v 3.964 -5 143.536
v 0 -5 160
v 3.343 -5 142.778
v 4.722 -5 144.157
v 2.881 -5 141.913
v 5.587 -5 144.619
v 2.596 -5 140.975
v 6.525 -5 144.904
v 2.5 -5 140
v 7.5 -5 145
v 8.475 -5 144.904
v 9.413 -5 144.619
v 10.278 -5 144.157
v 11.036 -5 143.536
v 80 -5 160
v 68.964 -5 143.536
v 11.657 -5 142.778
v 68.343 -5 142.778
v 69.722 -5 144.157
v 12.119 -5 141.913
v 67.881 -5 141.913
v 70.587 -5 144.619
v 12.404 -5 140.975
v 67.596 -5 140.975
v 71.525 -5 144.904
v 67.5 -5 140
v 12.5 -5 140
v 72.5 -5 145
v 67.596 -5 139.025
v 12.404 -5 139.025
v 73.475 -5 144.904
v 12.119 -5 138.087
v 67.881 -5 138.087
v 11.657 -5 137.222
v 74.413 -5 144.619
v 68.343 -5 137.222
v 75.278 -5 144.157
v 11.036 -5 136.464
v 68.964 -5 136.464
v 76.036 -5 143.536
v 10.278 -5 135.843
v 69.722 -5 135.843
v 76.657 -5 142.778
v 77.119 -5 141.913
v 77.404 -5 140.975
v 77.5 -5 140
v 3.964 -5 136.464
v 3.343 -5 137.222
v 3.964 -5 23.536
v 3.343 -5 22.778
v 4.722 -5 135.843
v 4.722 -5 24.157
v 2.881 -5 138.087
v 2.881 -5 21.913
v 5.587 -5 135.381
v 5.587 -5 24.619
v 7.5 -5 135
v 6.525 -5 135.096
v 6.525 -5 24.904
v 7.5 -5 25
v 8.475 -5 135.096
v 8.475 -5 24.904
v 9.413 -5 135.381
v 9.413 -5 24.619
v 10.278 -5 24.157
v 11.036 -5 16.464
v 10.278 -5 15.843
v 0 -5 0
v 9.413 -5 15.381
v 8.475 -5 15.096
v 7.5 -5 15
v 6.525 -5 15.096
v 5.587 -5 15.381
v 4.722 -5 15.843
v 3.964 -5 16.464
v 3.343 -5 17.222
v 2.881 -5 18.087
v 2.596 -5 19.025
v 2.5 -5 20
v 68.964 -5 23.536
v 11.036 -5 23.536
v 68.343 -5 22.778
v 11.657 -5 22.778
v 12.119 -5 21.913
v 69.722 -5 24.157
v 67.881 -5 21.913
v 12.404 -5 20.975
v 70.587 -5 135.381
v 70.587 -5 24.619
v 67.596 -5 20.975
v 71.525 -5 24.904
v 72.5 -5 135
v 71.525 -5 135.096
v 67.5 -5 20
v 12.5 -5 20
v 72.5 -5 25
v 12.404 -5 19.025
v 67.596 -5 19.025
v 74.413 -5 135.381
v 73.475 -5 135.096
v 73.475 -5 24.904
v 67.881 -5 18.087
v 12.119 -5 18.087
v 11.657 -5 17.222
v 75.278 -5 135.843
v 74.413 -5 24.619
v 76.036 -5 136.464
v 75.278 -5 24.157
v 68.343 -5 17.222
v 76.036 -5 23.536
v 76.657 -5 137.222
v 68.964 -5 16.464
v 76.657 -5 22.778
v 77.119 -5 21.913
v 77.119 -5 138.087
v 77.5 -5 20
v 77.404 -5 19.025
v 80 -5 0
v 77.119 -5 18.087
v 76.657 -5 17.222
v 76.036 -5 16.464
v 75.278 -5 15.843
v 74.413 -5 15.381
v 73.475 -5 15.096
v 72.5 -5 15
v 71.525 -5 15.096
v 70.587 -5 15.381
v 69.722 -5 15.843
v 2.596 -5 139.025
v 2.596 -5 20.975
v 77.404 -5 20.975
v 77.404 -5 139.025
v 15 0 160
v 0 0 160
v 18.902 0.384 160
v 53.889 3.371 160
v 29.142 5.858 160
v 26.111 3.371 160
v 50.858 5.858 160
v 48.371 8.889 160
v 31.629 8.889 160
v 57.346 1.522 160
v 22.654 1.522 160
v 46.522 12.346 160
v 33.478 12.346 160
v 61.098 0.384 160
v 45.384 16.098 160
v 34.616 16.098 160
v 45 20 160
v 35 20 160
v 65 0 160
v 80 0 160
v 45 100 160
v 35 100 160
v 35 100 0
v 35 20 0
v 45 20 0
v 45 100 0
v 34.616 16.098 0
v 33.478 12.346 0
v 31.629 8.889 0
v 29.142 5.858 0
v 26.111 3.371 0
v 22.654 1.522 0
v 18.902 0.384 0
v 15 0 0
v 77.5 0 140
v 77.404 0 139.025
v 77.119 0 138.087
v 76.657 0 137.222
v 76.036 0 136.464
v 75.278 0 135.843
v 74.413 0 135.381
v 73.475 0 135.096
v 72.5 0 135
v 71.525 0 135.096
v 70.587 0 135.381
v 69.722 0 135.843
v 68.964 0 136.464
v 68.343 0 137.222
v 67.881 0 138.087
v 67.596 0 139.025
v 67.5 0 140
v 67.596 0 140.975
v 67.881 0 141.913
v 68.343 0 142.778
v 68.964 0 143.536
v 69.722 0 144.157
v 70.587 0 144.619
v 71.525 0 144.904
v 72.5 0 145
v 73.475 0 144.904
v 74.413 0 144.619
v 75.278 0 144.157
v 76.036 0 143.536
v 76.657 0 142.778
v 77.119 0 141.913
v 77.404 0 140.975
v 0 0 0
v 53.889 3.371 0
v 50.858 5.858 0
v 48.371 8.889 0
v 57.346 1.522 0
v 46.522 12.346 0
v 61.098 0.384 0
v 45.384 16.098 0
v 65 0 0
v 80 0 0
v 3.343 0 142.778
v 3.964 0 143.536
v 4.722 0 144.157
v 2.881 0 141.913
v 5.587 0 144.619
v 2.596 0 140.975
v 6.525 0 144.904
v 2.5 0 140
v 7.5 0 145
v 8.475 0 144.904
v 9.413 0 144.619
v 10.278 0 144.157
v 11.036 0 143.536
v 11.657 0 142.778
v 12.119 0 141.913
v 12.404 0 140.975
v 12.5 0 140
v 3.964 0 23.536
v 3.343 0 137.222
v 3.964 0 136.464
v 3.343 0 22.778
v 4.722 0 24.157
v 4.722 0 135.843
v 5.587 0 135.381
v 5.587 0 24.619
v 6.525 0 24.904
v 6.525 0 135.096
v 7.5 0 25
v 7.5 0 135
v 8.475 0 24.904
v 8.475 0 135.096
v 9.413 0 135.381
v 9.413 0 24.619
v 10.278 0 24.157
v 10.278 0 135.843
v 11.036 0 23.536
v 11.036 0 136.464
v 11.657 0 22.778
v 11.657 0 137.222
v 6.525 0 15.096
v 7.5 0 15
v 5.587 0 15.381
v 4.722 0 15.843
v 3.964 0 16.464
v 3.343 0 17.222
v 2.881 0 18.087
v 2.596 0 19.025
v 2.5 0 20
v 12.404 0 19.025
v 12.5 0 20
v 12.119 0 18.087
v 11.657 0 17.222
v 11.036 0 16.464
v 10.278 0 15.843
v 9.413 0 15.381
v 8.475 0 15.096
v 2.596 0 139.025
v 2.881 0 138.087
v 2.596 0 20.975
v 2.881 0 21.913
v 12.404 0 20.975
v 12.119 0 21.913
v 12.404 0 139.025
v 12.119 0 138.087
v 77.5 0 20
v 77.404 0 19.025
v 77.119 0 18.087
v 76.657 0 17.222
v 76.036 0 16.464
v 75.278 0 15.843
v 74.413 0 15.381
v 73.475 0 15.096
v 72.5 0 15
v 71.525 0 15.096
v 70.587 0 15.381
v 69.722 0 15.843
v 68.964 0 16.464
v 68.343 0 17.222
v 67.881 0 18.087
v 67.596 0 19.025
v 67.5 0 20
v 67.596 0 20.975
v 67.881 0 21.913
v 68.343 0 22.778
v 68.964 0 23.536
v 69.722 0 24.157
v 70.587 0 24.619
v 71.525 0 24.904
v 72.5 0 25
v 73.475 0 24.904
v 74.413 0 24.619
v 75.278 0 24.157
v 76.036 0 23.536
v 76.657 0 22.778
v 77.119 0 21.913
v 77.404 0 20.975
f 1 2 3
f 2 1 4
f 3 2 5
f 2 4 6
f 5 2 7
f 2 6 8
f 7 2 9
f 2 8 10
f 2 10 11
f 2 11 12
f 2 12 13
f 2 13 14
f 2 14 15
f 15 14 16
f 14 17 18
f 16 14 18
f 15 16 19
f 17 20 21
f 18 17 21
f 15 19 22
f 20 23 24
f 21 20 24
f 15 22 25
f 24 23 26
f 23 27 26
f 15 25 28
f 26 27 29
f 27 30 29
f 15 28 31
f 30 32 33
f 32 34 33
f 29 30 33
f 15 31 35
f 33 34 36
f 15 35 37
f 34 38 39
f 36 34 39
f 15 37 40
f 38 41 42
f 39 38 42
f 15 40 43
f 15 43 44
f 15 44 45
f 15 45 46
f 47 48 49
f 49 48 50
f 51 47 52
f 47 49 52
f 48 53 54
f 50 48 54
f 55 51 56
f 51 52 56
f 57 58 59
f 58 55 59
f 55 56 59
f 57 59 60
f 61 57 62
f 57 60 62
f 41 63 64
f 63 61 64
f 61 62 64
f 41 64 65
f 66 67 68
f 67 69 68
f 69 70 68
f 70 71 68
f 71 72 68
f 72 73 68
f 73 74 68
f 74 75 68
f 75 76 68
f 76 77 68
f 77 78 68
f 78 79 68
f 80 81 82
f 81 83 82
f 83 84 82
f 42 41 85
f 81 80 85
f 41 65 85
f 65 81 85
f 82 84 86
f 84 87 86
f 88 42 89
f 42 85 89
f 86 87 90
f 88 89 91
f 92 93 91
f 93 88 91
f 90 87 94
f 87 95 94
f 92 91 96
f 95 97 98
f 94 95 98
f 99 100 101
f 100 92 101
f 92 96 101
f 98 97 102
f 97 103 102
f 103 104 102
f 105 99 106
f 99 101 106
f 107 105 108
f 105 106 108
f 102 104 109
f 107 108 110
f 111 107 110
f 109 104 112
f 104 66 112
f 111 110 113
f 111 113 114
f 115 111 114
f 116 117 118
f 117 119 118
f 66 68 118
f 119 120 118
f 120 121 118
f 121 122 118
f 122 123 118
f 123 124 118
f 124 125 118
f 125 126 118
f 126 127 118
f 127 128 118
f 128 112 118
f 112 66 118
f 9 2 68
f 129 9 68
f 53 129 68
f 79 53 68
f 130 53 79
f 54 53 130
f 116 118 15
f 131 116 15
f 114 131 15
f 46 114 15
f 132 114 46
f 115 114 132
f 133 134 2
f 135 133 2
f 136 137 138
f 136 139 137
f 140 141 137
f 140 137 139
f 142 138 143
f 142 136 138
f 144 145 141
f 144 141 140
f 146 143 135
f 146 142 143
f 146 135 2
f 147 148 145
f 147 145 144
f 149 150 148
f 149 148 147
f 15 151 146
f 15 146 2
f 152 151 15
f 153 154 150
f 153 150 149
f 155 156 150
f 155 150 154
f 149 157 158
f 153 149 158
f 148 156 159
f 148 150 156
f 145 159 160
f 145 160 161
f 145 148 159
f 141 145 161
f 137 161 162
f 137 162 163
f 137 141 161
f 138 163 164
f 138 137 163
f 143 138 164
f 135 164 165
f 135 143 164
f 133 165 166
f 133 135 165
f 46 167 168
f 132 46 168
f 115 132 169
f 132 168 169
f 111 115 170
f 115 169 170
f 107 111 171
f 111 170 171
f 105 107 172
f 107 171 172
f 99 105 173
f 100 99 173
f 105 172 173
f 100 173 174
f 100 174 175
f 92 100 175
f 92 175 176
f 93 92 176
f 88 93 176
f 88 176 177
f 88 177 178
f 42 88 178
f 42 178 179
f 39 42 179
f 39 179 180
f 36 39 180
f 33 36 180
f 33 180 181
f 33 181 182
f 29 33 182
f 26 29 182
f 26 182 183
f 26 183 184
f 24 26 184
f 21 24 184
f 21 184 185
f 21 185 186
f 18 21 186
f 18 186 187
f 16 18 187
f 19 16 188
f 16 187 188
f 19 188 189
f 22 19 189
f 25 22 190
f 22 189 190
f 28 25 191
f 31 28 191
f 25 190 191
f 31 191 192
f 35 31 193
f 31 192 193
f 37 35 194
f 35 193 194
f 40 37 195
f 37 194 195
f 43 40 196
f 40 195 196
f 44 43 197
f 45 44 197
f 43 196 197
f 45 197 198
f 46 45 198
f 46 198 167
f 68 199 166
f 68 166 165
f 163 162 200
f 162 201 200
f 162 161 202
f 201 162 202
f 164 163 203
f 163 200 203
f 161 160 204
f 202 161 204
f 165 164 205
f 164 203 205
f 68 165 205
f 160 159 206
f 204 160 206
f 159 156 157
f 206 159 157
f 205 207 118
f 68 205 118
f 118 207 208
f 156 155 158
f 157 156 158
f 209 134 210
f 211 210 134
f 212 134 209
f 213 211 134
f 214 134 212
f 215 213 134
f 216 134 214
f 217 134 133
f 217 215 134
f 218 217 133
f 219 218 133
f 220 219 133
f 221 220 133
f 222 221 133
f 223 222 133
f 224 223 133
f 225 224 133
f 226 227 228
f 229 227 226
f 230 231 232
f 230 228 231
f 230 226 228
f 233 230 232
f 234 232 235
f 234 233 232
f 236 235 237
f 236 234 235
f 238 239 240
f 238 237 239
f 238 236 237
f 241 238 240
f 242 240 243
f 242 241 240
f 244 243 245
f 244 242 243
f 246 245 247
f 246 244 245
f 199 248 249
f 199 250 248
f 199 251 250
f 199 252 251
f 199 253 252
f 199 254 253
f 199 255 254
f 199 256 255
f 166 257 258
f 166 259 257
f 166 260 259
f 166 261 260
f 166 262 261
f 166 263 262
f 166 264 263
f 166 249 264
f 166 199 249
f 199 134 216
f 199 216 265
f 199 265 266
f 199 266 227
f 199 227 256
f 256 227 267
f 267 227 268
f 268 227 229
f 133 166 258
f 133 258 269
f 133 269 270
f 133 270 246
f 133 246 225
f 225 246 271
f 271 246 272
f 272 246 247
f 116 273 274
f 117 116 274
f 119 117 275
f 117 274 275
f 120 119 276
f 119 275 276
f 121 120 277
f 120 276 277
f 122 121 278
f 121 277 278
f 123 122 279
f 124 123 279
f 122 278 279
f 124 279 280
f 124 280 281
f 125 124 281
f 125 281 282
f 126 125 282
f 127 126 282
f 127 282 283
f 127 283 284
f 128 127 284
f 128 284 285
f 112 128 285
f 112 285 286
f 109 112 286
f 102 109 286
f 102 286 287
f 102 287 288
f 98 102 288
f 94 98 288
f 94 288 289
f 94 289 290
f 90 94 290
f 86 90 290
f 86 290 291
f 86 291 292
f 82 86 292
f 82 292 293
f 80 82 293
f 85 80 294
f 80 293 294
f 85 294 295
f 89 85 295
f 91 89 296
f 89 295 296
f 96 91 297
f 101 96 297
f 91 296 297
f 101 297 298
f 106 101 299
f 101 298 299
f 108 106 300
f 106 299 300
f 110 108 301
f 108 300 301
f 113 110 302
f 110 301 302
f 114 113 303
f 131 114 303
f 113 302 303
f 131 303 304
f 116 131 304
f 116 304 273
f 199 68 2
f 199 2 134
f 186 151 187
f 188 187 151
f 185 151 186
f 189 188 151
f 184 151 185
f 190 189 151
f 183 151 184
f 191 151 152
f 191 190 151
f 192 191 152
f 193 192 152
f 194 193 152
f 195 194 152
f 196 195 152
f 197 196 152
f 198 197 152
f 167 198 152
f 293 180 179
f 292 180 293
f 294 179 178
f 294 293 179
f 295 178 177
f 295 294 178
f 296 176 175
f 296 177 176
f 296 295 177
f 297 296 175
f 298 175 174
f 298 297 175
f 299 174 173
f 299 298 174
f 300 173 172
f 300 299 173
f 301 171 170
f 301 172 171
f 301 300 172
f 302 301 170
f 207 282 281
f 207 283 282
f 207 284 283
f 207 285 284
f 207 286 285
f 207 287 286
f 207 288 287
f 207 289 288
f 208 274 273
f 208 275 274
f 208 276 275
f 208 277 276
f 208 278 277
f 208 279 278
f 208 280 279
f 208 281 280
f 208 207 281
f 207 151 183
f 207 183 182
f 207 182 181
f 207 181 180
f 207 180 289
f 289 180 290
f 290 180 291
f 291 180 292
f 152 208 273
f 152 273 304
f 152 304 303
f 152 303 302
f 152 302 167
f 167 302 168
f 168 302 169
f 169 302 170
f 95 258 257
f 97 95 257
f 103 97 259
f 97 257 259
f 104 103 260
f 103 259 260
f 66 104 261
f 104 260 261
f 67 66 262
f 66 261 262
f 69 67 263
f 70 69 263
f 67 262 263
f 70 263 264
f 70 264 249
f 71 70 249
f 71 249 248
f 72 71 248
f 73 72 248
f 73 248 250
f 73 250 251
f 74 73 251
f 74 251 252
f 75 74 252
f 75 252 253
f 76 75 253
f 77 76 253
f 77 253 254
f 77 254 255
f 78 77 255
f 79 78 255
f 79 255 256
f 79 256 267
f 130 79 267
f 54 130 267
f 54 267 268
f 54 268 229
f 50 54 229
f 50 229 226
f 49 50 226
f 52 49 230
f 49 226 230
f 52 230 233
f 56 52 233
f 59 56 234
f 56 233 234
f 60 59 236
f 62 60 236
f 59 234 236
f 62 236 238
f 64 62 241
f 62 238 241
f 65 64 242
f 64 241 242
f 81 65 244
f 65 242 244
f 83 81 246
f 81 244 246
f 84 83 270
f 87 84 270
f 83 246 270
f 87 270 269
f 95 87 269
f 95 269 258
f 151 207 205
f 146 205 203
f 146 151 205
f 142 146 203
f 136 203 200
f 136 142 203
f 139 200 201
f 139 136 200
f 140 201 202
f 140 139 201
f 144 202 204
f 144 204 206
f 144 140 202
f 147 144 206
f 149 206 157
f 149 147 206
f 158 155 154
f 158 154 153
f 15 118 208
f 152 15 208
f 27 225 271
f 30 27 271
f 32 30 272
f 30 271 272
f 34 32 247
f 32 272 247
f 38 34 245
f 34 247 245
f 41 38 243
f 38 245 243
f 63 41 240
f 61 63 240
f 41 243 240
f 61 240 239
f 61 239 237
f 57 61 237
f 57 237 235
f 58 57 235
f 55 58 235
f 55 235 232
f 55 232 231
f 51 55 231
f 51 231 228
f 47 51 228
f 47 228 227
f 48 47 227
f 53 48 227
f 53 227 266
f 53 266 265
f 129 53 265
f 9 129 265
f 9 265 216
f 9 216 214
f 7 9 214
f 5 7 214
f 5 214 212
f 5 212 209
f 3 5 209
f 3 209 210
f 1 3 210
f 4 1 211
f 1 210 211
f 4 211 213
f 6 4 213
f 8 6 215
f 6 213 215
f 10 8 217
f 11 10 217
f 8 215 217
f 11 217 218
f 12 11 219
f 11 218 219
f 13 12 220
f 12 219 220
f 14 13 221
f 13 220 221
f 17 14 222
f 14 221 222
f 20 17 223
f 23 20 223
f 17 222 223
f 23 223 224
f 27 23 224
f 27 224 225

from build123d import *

# Parameters (mm, degrees)
SKETCH2_W           = 10
SKETCH2_H           = 100
SKETCH2_W_2         = 80
SKETCH2_H_2         = 5
BOSS_EXTRUDE2_DEPTH = 160
FILLET1_R           = 20
SKETCH3_R           = 5
CUT_EXTRUDE2_DEPTH  = 10


with BuildPart() as part:
    # Sketch2 → Boss-Extrude2 (new body)
    with BuildSketch(Plane.XY):
        with Locations((40, 50)):
            Rectangle(SKETCH2_W, SKETCH2_H)
        with Locations((40, -2.5)):
            Rectangle(SKETCH2_W_2, SKETCH2_H_2)
    extrude(amount=BOSS_EXTRUDE2_DEPTH)

    # Fillet1
    fillet1_edges = [part.edges().sort_by_distance(p)[0] for p in [
        (45, 0, 80),
        (35, 0, 80),
    ]]
    fillet(fillet1_edges, radius=FILLET1_R)

    # Sketch3 → Cut-Extrude2 (cut)
    with BuildSketch(Plane(origin=(0, 0, 0), x_dir=(1, 0, 0), z_dir=(0, 1, 0))):
        with Locations((72.5, -20)):
            Circle(SKETCH3_R)
        with Locations((72.5, -140)):
            Circle(SKETCH3_R)
        with Locations((7.5, -140)):
            Circle(SKETCH3_R)
        with Locations((7.5, -20)):
            Circle(SKETCH3_R)
    extrude(amount=-CUT_EXTRUDE2_DEPTH, mode=Mode.SUBTRACT)


solid = part.part
